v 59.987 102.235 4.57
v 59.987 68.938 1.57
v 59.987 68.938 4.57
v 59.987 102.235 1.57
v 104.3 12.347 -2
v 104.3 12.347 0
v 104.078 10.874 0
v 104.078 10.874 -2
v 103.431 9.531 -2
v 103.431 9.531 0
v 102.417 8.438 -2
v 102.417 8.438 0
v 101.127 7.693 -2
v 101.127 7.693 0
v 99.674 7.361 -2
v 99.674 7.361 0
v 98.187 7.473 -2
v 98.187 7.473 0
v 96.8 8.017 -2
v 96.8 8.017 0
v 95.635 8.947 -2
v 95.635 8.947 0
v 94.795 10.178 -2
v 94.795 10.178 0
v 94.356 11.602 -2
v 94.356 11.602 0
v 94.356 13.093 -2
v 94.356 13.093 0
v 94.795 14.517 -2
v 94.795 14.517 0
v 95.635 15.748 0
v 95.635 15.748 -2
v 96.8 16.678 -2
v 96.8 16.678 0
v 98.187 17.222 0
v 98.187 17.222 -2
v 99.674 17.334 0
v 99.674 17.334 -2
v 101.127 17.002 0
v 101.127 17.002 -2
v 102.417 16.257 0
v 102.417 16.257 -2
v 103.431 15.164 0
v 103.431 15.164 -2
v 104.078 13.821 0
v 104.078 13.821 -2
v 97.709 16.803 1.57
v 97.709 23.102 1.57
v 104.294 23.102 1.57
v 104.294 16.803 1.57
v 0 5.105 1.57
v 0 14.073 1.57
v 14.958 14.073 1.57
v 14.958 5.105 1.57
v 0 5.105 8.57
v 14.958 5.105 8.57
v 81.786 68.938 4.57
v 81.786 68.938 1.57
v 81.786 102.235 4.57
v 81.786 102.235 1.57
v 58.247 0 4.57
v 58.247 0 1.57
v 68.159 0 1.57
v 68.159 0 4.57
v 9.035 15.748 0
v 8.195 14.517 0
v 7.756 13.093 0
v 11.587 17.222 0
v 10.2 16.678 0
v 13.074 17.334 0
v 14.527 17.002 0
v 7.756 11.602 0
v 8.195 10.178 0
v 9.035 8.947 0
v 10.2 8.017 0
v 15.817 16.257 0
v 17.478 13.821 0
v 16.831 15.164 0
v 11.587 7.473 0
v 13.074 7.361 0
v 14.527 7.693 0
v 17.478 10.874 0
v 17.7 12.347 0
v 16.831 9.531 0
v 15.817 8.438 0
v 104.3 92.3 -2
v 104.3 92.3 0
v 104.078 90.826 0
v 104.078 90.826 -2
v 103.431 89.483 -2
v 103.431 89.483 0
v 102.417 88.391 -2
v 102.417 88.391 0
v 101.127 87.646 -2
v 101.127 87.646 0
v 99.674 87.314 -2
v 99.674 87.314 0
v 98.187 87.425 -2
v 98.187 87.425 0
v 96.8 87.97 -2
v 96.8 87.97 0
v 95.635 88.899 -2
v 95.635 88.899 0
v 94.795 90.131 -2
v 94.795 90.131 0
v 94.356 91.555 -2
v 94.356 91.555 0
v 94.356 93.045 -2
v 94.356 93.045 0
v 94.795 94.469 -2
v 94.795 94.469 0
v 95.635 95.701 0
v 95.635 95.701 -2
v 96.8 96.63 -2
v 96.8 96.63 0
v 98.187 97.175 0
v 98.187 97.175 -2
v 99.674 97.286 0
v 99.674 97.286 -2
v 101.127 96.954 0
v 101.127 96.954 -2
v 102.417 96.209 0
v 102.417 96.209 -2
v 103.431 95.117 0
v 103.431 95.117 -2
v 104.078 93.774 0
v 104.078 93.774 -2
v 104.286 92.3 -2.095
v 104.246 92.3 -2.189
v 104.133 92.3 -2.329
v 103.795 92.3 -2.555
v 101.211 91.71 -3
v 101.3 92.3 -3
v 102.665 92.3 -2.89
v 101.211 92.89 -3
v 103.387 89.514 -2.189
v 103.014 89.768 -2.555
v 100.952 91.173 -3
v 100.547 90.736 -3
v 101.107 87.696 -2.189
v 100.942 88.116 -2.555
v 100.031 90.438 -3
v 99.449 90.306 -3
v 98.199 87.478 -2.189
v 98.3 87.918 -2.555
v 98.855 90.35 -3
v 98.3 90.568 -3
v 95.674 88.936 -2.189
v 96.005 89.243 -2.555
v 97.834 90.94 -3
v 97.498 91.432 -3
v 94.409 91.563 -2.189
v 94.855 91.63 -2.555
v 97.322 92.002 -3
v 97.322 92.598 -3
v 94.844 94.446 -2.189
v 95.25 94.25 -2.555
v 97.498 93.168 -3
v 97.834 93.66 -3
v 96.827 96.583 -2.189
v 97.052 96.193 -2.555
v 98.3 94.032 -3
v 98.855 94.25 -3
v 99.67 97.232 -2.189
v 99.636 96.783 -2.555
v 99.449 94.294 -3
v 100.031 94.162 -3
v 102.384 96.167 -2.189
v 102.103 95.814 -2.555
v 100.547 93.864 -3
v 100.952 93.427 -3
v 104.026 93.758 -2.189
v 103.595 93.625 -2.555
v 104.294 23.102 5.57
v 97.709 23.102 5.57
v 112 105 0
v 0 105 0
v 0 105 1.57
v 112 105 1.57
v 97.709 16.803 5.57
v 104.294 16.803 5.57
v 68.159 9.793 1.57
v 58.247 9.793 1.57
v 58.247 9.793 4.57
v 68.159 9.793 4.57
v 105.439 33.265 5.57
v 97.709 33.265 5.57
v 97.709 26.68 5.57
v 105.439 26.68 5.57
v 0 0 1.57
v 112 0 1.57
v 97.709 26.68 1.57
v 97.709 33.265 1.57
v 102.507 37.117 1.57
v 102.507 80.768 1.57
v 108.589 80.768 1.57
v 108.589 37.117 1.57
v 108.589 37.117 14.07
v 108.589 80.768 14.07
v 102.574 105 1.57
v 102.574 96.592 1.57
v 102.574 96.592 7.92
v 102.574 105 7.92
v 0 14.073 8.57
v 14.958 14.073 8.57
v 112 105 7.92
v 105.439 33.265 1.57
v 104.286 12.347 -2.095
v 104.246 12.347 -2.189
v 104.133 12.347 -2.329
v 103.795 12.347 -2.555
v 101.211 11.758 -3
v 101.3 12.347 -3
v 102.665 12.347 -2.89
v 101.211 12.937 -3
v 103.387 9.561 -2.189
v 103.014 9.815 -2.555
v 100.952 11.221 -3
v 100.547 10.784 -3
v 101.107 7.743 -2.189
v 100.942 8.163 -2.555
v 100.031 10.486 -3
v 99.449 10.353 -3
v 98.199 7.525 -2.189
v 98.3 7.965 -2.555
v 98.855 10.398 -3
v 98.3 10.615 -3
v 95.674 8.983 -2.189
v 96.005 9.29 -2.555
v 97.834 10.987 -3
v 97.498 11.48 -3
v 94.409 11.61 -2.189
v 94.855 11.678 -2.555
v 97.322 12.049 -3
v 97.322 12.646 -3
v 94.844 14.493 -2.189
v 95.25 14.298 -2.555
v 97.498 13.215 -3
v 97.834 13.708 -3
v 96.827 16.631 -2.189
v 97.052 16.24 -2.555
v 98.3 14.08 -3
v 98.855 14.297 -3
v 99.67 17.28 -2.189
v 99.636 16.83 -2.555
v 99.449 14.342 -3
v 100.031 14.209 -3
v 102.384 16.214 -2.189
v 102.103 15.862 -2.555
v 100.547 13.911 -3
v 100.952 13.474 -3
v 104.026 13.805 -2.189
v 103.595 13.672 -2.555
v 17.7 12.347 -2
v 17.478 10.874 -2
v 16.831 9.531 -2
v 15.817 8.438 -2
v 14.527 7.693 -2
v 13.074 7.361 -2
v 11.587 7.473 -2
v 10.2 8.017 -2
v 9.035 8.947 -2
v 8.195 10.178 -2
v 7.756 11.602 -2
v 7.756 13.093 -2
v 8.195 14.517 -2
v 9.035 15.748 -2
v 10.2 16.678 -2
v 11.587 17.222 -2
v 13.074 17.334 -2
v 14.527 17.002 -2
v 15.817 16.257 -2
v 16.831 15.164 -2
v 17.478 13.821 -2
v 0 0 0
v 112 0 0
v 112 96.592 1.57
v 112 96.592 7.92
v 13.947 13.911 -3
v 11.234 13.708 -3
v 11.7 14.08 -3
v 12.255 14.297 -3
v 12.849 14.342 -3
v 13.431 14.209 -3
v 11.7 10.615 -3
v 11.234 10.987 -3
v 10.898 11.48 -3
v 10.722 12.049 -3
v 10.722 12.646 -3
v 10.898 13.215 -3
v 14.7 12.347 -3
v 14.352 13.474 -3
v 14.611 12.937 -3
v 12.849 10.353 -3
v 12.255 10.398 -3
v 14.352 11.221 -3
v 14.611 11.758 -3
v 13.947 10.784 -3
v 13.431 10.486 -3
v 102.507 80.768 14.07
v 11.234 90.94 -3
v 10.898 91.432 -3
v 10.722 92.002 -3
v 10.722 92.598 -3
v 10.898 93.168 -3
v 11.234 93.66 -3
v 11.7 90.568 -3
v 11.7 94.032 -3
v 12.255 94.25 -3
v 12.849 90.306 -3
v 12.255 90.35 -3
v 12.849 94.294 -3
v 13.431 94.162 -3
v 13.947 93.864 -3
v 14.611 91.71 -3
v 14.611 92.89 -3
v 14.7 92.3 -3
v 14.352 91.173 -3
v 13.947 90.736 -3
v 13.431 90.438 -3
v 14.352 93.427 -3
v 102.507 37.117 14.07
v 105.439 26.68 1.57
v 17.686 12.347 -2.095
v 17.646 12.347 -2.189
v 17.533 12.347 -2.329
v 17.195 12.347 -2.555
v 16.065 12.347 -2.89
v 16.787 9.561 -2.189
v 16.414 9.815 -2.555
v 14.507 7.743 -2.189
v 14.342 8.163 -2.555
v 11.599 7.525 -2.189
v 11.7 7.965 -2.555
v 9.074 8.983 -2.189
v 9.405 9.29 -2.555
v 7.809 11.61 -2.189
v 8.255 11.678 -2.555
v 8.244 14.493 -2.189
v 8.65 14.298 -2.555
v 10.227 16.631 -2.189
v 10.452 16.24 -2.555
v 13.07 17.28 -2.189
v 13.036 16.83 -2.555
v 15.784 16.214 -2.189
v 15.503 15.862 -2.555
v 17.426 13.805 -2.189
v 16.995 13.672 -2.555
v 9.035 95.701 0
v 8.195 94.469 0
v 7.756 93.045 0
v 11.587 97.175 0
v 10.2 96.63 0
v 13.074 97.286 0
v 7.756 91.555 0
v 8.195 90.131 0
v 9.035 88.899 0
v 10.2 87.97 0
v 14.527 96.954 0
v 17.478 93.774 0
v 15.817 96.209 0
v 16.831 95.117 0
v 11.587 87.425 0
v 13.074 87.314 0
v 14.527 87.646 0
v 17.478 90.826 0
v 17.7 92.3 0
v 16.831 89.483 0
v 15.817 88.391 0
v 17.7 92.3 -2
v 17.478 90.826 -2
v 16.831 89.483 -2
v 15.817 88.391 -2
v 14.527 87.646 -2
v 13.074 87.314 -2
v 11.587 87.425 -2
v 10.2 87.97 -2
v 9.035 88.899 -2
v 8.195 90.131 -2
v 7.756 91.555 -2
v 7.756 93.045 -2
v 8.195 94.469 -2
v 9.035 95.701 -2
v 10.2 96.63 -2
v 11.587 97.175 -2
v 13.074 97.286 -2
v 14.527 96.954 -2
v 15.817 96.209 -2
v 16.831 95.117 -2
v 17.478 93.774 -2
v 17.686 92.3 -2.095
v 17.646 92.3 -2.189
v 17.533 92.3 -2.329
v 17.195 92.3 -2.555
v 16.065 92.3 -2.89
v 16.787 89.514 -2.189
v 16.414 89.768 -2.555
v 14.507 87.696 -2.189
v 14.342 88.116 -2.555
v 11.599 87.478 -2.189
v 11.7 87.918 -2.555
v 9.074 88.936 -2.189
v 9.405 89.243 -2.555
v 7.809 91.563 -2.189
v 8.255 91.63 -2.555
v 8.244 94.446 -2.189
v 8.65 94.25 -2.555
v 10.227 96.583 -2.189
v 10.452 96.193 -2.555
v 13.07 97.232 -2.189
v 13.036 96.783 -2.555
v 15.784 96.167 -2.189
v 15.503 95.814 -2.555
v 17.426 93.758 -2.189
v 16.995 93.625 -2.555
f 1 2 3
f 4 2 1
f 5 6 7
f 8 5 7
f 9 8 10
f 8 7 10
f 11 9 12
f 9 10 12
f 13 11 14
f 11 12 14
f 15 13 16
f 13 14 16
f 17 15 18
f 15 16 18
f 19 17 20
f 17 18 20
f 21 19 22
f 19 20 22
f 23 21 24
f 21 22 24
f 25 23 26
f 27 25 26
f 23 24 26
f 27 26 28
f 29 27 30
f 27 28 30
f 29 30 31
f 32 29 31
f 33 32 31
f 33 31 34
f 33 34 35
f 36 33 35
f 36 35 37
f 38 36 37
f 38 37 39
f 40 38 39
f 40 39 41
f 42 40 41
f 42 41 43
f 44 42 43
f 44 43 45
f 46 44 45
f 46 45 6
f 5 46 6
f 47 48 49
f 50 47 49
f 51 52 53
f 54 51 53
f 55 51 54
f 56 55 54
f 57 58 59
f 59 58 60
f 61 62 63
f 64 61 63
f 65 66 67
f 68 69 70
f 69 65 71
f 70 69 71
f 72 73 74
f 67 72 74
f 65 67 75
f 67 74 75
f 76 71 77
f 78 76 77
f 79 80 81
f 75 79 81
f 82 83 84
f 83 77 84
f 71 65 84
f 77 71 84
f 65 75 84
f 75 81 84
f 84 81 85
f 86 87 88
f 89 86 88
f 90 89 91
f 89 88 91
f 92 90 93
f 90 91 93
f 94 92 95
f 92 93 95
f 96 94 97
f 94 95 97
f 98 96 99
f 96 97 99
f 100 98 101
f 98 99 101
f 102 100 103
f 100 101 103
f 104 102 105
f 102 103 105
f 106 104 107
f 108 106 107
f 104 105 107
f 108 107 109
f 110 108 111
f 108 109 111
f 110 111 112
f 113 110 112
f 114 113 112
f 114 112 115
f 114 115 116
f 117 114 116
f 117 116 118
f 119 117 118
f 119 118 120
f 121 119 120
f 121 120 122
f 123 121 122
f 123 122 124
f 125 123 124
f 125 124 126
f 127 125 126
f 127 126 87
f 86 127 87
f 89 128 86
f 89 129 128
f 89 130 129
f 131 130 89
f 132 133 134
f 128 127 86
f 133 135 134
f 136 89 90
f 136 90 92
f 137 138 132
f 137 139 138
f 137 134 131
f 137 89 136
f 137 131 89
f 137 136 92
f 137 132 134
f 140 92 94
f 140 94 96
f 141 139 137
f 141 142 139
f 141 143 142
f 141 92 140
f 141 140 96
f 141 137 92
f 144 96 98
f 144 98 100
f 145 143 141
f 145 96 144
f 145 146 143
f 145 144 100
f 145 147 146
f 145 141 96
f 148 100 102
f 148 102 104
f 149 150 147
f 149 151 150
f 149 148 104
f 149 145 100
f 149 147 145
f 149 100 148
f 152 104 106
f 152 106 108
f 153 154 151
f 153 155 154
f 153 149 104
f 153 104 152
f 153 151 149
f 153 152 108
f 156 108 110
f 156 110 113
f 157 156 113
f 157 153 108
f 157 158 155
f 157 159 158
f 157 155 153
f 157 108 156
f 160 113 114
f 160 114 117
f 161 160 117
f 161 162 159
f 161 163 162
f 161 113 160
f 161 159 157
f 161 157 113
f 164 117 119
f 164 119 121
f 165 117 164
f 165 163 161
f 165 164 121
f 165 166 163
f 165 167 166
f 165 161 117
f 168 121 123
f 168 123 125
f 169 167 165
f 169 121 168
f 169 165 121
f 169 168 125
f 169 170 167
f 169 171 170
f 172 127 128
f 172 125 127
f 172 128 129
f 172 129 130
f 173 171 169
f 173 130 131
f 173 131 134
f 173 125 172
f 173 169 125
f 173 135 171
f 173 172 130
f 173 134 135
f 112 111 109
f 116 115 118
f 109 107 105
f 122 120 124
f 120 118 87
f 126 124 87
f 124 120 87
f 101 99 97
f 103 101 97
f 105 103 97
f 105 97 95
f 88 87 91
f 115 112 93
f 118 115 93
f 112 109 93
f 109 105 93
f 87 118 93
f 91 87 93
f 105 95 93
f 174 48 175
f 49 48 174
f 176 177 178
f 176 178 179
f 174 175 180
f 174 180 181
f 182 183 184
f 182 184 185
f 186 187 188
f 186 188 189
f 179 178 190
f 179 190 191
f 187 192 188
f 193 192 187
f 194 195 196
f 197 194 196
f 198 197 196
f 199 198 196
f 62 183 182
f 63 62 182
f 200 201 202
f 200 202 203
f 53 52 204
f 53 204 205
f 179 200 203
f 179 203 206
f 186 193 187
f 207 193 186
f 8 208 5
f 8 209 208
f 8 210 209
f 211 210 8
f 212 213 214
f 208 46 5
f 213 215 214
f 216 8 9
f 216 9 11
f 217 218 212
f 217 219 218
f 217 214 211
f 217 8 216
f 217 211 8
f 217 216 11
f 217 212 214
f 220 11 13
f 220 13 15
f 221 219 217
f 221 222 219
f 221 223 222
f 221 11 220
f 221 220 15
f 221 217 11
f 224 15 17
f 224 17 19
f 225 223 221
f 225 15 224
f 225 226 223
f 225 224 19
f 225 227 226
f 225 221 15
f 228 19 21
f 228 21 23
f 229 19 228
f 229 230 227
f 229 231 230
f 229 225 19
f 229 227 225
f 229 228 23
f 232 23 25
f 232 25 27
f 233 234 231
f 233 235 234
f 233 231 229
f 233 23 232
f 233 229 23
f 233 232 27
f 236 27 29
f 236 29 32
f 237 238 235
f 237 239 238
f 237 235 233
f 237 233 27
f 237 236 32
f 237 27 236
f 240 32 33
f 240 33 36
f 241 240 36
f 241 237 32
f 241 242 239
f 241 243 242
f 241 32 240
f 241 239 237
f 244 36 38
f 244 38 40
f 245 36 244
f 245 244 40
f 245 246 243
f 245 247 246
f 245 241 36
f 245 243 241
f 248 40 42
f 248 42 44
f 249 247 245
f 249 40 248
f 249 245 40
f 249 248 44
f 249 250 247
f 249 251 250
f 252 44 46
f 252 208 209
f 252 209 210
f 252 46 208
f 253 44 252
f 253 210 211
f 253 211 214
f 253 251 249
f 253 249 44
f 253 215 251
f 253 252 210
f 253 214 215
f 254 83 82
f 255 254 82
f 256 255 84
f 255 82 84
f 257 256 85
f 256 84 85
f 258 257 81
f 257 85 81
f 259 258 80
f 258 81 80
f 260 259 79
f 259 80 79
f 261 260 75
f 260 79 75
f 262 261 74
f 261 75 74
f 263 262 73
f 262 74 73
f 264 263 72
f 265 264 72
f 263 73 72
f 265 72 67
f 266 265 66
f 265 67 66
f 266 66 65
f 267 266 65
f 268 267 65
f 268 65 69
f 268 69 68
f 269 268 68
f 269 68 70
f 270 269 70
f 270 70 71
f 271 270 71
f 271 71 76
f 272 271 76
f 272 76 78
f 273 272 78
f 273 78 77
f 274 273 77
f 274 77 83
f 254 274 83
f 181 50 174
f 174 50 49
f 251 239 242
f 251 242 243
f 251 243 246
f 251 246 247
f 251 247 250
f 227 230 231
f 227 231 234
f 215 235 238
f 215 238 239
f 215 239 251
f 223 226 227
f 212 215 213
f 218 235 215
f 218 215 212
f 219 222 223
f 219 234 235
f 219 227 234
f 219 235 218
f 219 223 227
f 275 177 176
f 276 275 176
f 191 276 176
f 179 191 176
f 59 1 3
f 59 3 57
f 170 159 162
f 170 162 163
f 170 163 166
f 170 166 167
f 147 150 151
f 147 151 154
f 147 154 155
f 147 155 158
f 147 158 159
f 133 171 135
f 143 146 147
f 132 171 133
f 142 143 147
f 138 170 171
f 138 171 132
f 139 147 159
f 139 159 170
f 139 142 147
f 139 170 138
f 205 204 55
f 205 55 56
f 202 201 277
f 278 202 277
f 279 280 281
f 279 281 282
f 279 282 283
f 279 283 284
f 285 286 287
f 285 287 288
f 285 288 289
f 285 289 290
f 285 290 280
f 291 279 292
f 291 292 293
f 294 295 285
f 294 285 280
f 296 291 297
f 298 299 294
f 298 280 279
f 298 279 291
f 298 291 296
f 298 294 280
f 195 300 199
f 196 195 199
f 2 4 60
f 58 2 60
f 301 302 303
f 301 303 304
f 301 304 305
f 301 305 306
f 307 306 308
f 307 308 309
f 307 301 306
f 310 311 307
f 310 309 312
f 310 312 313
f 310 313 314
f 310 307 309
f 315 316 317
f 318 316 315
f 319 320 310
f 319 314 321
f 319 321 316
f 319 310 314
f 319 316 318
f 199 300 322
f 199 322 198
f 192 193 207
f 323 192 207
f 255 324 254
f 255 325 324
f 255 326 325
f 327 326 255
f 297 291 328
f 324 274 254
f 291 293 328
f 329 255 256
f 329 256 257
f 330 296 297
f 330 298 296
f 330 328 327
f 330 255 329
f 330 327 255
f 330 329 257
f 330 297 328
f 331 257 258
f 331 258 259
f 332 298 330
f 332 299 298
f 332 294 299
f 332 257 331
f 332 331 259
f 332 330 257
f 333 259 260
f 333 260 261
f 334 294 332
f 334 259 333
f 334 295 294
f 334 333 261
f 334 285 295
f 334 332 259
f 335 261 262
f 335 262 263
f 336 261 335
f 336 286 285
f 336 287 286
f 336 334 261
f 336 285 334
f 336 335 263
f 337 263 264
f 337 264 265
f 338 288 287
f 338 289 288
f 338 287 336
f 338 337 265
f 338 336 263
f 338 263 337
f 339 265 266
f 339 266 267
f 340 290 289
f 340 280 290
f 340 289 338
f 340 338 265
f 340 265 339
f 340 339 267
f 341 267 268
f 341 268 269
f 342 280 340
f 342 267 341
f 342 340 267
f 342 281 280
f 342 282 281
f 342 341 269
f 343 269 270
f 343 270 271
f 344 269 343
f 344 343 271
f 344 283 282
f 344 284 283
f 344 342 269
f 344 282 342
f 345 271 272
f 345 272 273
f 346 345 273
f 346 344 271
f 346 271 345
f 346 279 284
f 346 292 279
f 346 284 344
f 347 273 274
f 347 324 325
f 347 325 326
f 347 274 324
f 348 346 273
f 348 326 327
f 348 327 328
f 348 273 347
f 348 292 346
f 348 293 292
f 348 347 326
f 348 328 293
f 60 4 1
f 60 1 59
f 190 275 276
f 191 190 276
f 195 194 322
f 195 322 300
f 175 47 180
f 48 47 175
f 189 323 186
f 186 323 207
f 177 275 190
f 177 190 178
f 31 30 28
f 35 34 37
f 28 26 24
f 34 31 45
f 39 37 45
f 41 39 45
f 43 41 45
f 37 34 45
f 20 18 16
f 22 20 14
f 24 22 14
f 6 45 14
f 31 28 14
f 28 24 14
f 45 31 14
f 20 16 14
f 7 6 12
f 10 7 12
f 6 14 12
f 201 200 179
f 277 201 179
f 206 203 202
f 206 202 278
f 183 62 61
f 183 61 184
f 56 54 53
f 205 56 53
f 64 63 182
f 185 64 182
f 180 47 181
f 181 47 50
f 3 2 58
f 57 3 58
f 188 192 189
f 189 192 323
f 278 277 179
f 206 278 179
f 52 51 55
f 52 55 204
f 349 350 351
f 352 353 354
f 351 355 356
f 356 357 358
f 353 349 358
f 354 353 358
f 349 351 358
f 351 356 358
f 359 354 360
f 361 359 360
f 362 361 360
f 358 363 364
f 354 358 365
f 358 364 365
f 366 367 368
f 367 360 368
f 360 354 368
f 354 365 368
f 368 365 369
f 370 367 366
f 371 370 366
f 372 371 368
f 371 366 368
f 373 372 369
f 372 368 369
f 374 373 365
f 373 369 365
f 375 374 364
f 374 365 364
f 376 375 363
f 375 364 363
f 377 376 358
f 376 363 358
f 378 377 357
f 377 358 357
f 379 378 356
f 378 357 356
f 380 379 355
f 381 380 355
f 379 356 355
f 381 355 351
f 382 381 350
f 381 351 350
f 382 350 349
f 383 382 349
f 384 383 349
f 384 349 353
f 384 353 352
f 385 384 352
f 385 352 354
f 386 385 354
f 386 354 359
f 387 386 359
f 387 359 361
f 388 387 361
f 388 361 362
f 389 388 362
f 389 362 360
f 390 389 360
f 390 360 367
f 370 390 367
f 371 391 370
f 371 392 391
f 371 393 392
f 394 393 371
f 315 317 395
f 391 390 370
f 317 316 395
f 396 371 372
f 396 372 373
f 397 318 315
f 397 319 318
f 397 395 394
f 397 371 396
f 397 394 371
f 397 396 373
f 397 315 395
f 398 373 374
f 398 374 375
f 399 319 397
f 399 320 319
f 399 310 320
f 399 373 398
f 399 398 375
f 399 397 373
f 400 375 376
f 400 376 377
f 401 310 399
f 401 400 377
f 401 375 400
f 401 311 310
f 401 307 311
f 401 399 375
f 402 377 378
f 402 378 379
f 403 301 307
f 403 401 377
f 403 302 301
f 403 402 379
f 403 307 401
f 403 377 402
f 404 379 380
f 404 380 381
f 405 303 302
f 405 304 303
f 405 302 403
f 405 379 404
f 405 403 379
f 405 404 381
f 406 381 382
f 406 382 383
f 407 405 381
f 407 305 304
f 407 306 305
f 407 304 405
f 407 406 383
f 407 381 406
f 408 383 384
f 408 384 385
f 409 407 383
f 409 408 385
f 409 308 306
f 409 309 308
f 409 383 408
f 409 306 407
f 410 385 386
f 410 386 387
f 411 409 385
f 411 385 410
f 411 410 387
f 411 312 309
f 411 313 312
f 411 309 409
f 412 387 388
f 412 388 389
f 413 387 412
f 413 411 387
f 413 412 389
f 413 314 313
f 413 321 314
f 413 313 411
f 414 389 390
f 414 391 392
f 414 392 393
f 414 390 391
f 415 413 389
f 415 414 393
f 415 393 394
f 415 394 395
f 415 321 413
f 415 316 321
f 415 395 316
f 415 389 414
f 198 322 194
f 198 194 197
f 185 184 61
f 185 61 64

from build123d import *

# Parameters (mm, degrees)
SKETCH1_W             = 112
SKETCH1_H             = 105
BASE_PCB_DEPTH        = 1.57
SMA_START             = 1.57
SKETCH1_3_W           = 9.425761926
SKETCH1_3_H           = 8.407839617
SMA_CONNECTOR_DEPTH   = 6.35
MINI_START            = 1.57
SKETCH1_4_W           = 9.91153772
SKETCH1_4_H           = 9.792921807
MINI_USB_DEPTH        = 3
BARREL_START          = 1.57
SKETCH1_5_W           = 14.958155809
SKETCH1_5_H           = 8.968458872
BARREL_JACK_DEPTH     = 7
GPIO_START            = 1.57
SKETCH1_6_W           = 6.081801239
SKETCH1_6_H           = 43.650976509
GPIO_DEPTH            = 12.5
BUTTONS_START         = 1.57
SKETCH1_7_W           = 7.730121667
SKETCH1_7_H           = 6.584918457
BUTTONS_DEPTH         = 4
SKETCH1_7_W_2         = 6.584918457
SKETCH1_7_H_2         = 6.298617654
BUTTONS_2_DEPTH       = 4
XBEE_START            = 1.57
SKETCH1_8_W           = 21.798337537
SKETCH1_8_H           = 33.296361733
XBEE_DEPTH            = 3
SKETCH2_R             = 5
BOSS_EXTRUDE8_DEPTH   = 3
BOSS_EXTRUDE8_2_DEPTH = 3
BOSS_EXTRUDE8_3_DEPTH = 3
BOSS_EXTRUDE8_4_DEPTH = 3
FILLET1_SIZE          = 1
FILLET1_SIZE_2        = 3
FILLET2_SIZE          = 1
FILLET2_SIZE_2        = 3
FILLET3_SIZE          = 1
FILLET3_SIZE_2        = 3
FILLET4_SIZE          = 1
FILLET4_SIZE_2        = 3


with BuildPart() as part:
    # Sketch1 → Base PCB (new body)
    with BuildSketch(Plane.XY):
        with Locations((56, 52.5)):
            Rectangle(SKETCH1_W, SKETCH1_H)
    extrude(amount=BASE_PCB_DEPTH)


with BuildPart() as body_2:
    # Sketch1<3> → SMA Connector (new body)
    with BuildSketch(Plane.XY.offset(SMA_START)):
        with Locations((107.287119037, 100.796080192)):
            Rectangle(SKETCH1_3_W, SKETCH1_3_H)
    extrude(amount=SMA_CONNECTOR_DEPTH)


with BuildPart() as body_3:
    # Sketch1<4> → Mini USB (new body)
    with BuildSketch(Plane.XY.offset(MINI_START)):
        with Locations((63.202795022, 4.896460904)):
            Rectangle(SKETCH1_4_W, SKETCH1_4_H)
    extrude(amount=MINI_USB_DEPTH)


with BuildPart() as body_4:
    # Sketch1<5> → Barrel Jack (new body)
    with BuildSketch(Plane.XY.offset(BARREL_START)):
        with Locations((7.479077905, 9.58918666)):
            Rectangle(SKETCH1_5_W, SKETCH1_5_H)
    extrude(amount=BARREL_JACK_DEPTH)


with BuildPart() as body_5:
    # Sketch1<6> → GPIO (new body)
    with BuildSketch(Plane.XY.offset(GPIO_START)):
        with Locations((105.547707115, 58.942048646)):
            Rectangle(SKETCH1_6_W, SKETCH1_6_H)
    extrude(amount=GPIO_DEPTH)


with BuildPart() as body_6:
    # Sketch1<7> → Buttons (new body)
    with BuildSketch(Plane.XY.offset(BUTTONS_START)):
        with Locations((101.574238073, 29.972941445)):
            Rectangle(SKETCH1_7_W, SKETCH1_7_H)
    extrude(amount=BUTTONS_DEPTH)


with BuildPart() as body_7:
    # Sketch1<7> → Buttons 2 (new body)
    with BuildSketch(Plane.XY.offset(BUTTONS_START)):
        with Locations((101.001636469, 19.952413358)):
            Rectangle(SKETCH1_7_W_2, SKETCH1_7_H_2)
    extrude(amount=BUTTONS_2_DEPTH)


with BuildPart() as body_8:
    # Sketch1<8> → Xbee (new body)
    with BuildSketch(Plane.XY.offset(XBEE_START)):
        with Locations((70.886461835, 85.586335751)):
            Rectangle(SKETCH1_8_W, SKETCH1_8_H)
    extrude(amount=XBEE_DEPTH)


with BuildPart() as body_9:
    # Sketch2 → Boss-Extrude8 (new body)
    with BuildSketch(Plane(origin=(0, 0, 0), x_dir=(-1, 0, 0), z_dir=(0, 0, -1))):
        with Locations(Location((-99.3, 92.3, 0), (0, 0, 180))):
            Circle(SKETCH2_R)
    extrude(amount=BOSS_EXTRUDE8_DEPTH)

    # Fillet1
    # an asymmetric fillet: 3, 1 mm, written as the material it takes off along each edge
    with BuildSketch(Plane(origin=(99.3, 92.3, -3), x_dir=(1, 0, 0), z_dir=(0, 1, 0))) as fillet1_piece_1:
        with BuildLine():
            Bezier((5, -FILLET1_SIZE), (5, 0), (5 - FILLET1_SIZE_2, 0), weights=[1, 0.707106781, 1])
            Line((5 - FILLET1_SIZE_2, 0), (5, 0))
            Line((5, 0), (5, -FILLET1_SIZE))
        make_face()
    revolve(axis=Axis((99.3, 92.3, -3), (0, 0, -1)), mode=Mode.SUBTRACT)


with BuildPart() as body_10:
    # Sketch2 → Boss-Extrude8 2 (new body)
    with BuildSketch(Plane(origin=(0, 0, 0), x_dir=(-1, 0, 0), z_dir=(0, 0, -1))):
        with Locations(Location((-12.7, 92.3, 0), (0, 0, 180))):
            Circle(SKETCH2_R)
    extrude(amount=BOSS_EXTRUDE8_2_DEPTH)

    # Fillet3
    # an asymmetric fillet: 3, 1 mm, written as the material it takes off along each edge
    with BuildSketch(Plane(origin=(12.7, 92.3, -3), x_dir=(1, 0, 0), z_dir=(0, 1, 0))) as fillet3_piece_1:
        with BuildLine():
            Bezier((5, -FILLET3_SIZE), (5, 0), (5 - FILLET3_SIZE_2, 0), weights=[1, 0.707106781, 1])
            Line((5 - FILLET3_SIZE_2, 0), (5, 0))
            Line((5, 0), (5, -FILLET3_SIZE))
        make_face()
    revolve(axis=Axis((12.7, 92.3, -3), (0, 0, -1)), mode=Mode.SUBTRACT)


with BuildPart() as body_11:
    # Sketch2 → Boss-Extrude8 3 (new body)
    with BuildSketch(Plane(origin=(0, 0, 0), x_dir=(-1, 0, 0), z_dir=(0, 0, -1))):
        with Locations(Location((-99.3, 12.347488339, 0), (0, 0, 180))):
            Circle(SKETCH2_R)
    extrude(amount=BOSS_EXTRUDE8_3_DEPTH)

    # Fillet2
    # an asymmetric fillet: 3, 1 mm, written as the material it takes off along each edge
    with BuildSketch(Plane(origin=(99.3, 12.347488339, -3), x_dir=(1, 0, 0), z_dir=(0, 1, 0))) as fillet2_piece_1:
        with BuildLine():
            Bezier((5, -FILLET2_SIZE), (5, 0), (5 - FILLET2_SIZE_2, 0), weights=[1, 0.707106781, 1])
            Line((5 - FILLET2_SIZE_2, 0), (5, 0))
            Line((5, 0), (5, -FILLET2_SIZE))
        make_face()
    revolve(axis=Axis((99.3, 12.347488339, -3), (0, 0, -1)), mode=Mode.SUBTRACT)


with BuildPart() as body_12:
    # Sketch2 → Boss-Extrude8 4 (new body)
    with BuildSketch(Plane(origin=(0, 0, 0), x_dir=(-1, 0, 0), z_dir=(0, 0, -1))):
        with Locations(Location((-12.7, 12.347488339, 0), (0, 0, 180))):
            Circle(SKETCH2_R)
    extrude(amount=BOSS_EXTRUDE8_4_DEPTH)

    # Fillet4
    # an asymmetric fillet: 3, 1 mm, written as the material it takes off along each edge
    with BuildSketch(Plane(origin=(12.7, 12.347488339, -3), x_dir=(1, 0, 0), z_dir=(0, 1, 0))) as fillet4_piece_1:
        with BuildLine():
            Bezier((5, -FILLET4_SIZE), (5, 0), (5 - FILLET4_SIZE_2, 0), weights=[1, 0.707106781, 1])
            Line((5 - FILLET4_SIZE_2, 0), (5, 0))
            Line((5, 0), (5, -FILLET4_SIZE))
        make_face()
    revolve(axis=Axis((12.7, 12.347488339, -3), (0, 0, -1)), mode=Mode.SUBTRACT)


solid = Compound([part.part, body_2.part, body_3.part, body_4.part, body_5.part, body_6.part, body_7.part, body_8.part, body_9.part, body_10.part, body_11.part, body_12.part])
